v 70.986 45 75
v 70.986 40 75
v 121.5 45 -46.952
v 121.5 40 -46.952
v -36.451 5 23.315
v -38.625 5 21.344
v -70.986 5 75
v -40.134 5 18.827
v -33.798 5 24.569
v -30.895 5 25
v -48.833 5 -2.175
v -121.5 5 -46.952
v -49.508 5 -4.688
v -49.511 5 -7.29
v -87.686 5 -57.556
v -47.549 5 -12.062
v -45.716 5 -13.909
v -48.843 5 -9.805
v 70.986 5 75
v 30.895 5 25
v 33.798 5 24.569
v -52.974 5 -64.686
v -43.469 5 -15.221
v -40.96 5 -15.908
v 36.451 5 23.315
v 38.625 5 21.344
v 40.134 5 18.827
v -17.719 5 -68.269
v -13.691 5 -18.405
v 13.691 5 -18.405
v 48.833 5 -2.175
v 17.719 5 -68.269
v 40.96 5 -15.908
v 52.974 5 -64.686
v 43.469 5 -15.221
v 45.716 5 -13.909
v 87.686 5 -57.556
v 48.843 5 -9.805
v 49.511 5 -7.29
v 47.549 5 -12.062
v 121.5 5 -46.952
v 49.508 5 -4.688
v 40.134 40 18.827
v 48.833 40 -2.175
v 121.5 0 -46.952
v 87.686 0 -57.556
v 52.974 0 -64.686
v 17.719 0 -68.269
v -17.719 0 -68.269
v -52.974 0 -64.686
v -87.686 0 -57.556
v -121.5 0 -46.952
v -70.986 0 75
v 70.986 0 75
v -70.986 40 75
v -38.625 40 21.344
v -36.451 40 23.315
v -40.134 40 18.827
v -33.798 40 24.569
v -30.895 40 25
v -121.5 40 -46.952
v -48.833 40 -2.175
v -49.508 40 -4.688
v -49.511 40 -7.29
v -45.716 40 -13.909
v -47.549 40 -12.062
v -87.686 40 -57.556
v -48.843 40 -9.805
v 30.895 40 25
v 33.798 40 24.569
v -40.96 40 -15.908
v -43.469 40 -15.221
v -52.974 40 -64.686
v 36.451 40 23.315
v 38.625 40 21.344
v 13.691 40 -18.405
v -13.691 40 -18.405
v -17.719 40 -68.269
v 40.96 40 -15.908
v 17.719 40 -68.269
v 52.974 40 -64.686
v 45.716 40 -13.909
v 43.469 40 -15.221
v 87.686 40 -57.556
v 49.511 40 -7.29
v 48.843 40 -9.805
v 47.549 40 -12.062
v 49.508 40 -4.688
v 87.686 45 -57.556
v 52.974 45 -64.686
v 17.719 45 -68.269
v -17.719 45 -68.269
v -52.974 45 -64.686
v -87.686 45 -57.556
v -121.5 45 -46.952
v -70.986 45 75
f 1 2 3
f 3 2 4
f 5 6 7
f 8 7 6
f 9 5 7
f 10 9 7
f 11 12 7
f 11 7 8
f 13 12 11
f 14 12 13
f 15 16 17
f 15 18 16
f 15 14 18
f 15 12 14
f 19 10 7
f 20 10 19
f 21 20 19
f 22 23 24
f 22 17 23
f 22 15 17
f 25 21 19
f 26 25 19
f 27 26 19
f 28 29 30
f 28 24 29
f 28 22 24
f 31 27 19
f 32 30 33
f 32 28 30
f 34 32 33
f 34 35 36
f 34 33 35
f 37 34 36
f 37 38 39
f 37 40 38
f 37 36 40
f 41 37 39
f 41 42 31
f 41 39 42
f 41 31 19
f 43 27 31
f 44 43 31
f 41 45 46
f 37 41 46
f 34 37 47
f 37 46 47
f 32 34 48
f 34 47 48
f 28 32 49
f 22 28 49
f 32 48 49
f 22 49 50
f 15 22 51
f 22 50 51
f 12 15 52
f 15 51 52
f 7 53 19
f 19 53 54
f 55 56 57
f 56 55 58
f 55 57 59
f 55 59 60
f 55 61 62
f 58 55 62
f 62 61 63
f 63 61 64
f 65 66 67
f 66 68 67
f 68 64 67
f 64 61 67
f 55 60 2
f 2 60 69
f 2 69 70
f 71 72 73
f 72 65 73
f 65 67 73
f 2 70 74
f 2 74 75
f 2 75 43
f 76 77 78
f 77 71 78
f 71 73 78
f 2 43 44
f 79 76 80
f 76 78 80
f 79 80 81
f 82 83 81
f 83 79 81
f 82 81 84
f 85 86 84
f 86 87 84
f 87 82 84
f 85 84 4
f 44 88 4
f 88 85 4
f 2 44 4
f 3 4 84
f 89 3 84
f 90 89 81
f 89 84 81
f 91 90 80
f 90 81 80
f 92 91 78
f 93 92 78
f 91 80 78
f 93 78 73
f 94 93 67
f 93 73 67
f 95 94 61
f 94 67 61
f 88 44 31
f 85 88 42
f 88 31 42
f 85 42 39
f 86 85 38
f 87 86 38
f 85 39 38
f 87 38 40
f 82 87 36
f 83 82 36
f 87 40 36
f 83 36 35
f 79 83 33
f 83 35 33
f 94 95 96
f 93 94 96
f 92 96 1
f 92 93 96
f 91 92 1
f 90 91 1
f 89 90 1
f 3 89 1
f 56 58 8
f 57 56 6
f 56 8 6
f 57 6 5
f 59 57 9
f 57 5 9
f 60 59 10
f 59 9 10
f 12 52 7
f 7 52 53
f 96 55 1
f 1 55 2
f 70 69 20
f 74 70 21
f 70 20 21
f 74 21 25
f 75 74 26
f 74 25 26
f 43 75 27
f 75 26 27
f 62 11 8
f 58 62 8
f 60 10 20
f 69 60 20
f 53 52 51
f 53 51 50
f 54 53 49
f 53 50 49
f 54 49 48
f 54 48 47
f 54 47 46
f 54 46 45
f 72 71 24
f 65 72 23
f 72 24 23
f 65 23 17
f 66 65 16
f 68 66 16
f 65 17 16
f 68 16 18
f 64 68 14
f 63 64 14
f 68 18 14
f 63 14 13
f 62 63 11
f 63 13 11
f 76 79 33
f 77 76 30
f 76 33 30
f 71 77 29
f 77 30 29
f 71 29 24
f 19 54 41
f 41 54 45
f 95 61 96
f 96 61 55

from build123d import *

# Parameters (mm, degrees)
BOSS_EXTRUDE1_DEPTH = 5
BOSS_EXTRUDE2_DEPTH = 35
BOSS_EXTRUDE3_DEPTH = 5


with BuildPart() as part:
    # Sketch1 → Boss-Extrude1 (new body)
    with BuildSketch(Plane(origin=(0, 0, 0), x_dir=(1, 0, 0), z_dir=(0, 1, 0))):
        with BuildLine():
            Line((-121.5, 46.952098291), (-70.985786928, -75))
            Line((-70.985786928, -75), (70.985786928, -75))
            Line((70.985786928, -75), (121.5, 46.952098291))
            ThreePointArc((121.5, 46.952098291), (0, 68.717806969), (-121.5, 46.952098291))
        make_face()
    extrude(amount=BOSS_EXTRUDE1_DEPTH)

    # Sketch2 → Boss-Extrude2 (add)
    with BuildSketch(Plane(origin=(0, 5, 0), x_dir=(1, 0, 0), z_dir=(0, 1, 0))):
        with BuildLine():
            Line((-48.833229971, 2.175293041), (-40.133863978, -18.826834324))
            ThreePointArc((-40.133863978, -18.826834324), (-36.450770983, -23.314696123), (-30.895068653, -25))
            Line((-30.895068653, -25), (30.895068653, -25))
            ThreePointArc((30.895068653, -25), (36.450770983, -23.314696123), (40.133863978, -18.826834324))
            Line((40.133863978, -18.826834324), (48.833229971, 2.175293041))
            ThreePointArc((48.833229971, 2.175293041), (48.269800459, 10.975861174), (40.959759978, 15.90848324))
            ThreePointArc((40.959759978, 15.90848324), (0, 18.717806969), (-40.959759978, 15.90848324))
            ThreePointArc((-40.959759978, 15.90848324), (-48.269800459, 10.975861174), (-48.833229971, 2.175293041))
        make_face()
    extrude(amount=BOSS_EXTRUDE2_DEPTH)

    # Sketch3 → Boss-Extrude3 (add)
    with BuildSketch(Plane(origin=(0, 40, 0), x_dir=(1, 0, 0), z_dir=(0, 1, 0))):
        with BuildLine():
            Line((-121.5, 46.952098291), (-70.985786928, -75))
            Line((-70.985786928, -75), (70.985786928, -75))
            Line((70.985786928, -75), (121.5, 46.952098291))
            ThreePointArc((121.5, 46.952098291), (0, 68.717806969), (-121.5, 46.952098291))
        make_face()
    extrude(amount=BOSS_EXTRUDE3_DEPTH)


solid = part.part
